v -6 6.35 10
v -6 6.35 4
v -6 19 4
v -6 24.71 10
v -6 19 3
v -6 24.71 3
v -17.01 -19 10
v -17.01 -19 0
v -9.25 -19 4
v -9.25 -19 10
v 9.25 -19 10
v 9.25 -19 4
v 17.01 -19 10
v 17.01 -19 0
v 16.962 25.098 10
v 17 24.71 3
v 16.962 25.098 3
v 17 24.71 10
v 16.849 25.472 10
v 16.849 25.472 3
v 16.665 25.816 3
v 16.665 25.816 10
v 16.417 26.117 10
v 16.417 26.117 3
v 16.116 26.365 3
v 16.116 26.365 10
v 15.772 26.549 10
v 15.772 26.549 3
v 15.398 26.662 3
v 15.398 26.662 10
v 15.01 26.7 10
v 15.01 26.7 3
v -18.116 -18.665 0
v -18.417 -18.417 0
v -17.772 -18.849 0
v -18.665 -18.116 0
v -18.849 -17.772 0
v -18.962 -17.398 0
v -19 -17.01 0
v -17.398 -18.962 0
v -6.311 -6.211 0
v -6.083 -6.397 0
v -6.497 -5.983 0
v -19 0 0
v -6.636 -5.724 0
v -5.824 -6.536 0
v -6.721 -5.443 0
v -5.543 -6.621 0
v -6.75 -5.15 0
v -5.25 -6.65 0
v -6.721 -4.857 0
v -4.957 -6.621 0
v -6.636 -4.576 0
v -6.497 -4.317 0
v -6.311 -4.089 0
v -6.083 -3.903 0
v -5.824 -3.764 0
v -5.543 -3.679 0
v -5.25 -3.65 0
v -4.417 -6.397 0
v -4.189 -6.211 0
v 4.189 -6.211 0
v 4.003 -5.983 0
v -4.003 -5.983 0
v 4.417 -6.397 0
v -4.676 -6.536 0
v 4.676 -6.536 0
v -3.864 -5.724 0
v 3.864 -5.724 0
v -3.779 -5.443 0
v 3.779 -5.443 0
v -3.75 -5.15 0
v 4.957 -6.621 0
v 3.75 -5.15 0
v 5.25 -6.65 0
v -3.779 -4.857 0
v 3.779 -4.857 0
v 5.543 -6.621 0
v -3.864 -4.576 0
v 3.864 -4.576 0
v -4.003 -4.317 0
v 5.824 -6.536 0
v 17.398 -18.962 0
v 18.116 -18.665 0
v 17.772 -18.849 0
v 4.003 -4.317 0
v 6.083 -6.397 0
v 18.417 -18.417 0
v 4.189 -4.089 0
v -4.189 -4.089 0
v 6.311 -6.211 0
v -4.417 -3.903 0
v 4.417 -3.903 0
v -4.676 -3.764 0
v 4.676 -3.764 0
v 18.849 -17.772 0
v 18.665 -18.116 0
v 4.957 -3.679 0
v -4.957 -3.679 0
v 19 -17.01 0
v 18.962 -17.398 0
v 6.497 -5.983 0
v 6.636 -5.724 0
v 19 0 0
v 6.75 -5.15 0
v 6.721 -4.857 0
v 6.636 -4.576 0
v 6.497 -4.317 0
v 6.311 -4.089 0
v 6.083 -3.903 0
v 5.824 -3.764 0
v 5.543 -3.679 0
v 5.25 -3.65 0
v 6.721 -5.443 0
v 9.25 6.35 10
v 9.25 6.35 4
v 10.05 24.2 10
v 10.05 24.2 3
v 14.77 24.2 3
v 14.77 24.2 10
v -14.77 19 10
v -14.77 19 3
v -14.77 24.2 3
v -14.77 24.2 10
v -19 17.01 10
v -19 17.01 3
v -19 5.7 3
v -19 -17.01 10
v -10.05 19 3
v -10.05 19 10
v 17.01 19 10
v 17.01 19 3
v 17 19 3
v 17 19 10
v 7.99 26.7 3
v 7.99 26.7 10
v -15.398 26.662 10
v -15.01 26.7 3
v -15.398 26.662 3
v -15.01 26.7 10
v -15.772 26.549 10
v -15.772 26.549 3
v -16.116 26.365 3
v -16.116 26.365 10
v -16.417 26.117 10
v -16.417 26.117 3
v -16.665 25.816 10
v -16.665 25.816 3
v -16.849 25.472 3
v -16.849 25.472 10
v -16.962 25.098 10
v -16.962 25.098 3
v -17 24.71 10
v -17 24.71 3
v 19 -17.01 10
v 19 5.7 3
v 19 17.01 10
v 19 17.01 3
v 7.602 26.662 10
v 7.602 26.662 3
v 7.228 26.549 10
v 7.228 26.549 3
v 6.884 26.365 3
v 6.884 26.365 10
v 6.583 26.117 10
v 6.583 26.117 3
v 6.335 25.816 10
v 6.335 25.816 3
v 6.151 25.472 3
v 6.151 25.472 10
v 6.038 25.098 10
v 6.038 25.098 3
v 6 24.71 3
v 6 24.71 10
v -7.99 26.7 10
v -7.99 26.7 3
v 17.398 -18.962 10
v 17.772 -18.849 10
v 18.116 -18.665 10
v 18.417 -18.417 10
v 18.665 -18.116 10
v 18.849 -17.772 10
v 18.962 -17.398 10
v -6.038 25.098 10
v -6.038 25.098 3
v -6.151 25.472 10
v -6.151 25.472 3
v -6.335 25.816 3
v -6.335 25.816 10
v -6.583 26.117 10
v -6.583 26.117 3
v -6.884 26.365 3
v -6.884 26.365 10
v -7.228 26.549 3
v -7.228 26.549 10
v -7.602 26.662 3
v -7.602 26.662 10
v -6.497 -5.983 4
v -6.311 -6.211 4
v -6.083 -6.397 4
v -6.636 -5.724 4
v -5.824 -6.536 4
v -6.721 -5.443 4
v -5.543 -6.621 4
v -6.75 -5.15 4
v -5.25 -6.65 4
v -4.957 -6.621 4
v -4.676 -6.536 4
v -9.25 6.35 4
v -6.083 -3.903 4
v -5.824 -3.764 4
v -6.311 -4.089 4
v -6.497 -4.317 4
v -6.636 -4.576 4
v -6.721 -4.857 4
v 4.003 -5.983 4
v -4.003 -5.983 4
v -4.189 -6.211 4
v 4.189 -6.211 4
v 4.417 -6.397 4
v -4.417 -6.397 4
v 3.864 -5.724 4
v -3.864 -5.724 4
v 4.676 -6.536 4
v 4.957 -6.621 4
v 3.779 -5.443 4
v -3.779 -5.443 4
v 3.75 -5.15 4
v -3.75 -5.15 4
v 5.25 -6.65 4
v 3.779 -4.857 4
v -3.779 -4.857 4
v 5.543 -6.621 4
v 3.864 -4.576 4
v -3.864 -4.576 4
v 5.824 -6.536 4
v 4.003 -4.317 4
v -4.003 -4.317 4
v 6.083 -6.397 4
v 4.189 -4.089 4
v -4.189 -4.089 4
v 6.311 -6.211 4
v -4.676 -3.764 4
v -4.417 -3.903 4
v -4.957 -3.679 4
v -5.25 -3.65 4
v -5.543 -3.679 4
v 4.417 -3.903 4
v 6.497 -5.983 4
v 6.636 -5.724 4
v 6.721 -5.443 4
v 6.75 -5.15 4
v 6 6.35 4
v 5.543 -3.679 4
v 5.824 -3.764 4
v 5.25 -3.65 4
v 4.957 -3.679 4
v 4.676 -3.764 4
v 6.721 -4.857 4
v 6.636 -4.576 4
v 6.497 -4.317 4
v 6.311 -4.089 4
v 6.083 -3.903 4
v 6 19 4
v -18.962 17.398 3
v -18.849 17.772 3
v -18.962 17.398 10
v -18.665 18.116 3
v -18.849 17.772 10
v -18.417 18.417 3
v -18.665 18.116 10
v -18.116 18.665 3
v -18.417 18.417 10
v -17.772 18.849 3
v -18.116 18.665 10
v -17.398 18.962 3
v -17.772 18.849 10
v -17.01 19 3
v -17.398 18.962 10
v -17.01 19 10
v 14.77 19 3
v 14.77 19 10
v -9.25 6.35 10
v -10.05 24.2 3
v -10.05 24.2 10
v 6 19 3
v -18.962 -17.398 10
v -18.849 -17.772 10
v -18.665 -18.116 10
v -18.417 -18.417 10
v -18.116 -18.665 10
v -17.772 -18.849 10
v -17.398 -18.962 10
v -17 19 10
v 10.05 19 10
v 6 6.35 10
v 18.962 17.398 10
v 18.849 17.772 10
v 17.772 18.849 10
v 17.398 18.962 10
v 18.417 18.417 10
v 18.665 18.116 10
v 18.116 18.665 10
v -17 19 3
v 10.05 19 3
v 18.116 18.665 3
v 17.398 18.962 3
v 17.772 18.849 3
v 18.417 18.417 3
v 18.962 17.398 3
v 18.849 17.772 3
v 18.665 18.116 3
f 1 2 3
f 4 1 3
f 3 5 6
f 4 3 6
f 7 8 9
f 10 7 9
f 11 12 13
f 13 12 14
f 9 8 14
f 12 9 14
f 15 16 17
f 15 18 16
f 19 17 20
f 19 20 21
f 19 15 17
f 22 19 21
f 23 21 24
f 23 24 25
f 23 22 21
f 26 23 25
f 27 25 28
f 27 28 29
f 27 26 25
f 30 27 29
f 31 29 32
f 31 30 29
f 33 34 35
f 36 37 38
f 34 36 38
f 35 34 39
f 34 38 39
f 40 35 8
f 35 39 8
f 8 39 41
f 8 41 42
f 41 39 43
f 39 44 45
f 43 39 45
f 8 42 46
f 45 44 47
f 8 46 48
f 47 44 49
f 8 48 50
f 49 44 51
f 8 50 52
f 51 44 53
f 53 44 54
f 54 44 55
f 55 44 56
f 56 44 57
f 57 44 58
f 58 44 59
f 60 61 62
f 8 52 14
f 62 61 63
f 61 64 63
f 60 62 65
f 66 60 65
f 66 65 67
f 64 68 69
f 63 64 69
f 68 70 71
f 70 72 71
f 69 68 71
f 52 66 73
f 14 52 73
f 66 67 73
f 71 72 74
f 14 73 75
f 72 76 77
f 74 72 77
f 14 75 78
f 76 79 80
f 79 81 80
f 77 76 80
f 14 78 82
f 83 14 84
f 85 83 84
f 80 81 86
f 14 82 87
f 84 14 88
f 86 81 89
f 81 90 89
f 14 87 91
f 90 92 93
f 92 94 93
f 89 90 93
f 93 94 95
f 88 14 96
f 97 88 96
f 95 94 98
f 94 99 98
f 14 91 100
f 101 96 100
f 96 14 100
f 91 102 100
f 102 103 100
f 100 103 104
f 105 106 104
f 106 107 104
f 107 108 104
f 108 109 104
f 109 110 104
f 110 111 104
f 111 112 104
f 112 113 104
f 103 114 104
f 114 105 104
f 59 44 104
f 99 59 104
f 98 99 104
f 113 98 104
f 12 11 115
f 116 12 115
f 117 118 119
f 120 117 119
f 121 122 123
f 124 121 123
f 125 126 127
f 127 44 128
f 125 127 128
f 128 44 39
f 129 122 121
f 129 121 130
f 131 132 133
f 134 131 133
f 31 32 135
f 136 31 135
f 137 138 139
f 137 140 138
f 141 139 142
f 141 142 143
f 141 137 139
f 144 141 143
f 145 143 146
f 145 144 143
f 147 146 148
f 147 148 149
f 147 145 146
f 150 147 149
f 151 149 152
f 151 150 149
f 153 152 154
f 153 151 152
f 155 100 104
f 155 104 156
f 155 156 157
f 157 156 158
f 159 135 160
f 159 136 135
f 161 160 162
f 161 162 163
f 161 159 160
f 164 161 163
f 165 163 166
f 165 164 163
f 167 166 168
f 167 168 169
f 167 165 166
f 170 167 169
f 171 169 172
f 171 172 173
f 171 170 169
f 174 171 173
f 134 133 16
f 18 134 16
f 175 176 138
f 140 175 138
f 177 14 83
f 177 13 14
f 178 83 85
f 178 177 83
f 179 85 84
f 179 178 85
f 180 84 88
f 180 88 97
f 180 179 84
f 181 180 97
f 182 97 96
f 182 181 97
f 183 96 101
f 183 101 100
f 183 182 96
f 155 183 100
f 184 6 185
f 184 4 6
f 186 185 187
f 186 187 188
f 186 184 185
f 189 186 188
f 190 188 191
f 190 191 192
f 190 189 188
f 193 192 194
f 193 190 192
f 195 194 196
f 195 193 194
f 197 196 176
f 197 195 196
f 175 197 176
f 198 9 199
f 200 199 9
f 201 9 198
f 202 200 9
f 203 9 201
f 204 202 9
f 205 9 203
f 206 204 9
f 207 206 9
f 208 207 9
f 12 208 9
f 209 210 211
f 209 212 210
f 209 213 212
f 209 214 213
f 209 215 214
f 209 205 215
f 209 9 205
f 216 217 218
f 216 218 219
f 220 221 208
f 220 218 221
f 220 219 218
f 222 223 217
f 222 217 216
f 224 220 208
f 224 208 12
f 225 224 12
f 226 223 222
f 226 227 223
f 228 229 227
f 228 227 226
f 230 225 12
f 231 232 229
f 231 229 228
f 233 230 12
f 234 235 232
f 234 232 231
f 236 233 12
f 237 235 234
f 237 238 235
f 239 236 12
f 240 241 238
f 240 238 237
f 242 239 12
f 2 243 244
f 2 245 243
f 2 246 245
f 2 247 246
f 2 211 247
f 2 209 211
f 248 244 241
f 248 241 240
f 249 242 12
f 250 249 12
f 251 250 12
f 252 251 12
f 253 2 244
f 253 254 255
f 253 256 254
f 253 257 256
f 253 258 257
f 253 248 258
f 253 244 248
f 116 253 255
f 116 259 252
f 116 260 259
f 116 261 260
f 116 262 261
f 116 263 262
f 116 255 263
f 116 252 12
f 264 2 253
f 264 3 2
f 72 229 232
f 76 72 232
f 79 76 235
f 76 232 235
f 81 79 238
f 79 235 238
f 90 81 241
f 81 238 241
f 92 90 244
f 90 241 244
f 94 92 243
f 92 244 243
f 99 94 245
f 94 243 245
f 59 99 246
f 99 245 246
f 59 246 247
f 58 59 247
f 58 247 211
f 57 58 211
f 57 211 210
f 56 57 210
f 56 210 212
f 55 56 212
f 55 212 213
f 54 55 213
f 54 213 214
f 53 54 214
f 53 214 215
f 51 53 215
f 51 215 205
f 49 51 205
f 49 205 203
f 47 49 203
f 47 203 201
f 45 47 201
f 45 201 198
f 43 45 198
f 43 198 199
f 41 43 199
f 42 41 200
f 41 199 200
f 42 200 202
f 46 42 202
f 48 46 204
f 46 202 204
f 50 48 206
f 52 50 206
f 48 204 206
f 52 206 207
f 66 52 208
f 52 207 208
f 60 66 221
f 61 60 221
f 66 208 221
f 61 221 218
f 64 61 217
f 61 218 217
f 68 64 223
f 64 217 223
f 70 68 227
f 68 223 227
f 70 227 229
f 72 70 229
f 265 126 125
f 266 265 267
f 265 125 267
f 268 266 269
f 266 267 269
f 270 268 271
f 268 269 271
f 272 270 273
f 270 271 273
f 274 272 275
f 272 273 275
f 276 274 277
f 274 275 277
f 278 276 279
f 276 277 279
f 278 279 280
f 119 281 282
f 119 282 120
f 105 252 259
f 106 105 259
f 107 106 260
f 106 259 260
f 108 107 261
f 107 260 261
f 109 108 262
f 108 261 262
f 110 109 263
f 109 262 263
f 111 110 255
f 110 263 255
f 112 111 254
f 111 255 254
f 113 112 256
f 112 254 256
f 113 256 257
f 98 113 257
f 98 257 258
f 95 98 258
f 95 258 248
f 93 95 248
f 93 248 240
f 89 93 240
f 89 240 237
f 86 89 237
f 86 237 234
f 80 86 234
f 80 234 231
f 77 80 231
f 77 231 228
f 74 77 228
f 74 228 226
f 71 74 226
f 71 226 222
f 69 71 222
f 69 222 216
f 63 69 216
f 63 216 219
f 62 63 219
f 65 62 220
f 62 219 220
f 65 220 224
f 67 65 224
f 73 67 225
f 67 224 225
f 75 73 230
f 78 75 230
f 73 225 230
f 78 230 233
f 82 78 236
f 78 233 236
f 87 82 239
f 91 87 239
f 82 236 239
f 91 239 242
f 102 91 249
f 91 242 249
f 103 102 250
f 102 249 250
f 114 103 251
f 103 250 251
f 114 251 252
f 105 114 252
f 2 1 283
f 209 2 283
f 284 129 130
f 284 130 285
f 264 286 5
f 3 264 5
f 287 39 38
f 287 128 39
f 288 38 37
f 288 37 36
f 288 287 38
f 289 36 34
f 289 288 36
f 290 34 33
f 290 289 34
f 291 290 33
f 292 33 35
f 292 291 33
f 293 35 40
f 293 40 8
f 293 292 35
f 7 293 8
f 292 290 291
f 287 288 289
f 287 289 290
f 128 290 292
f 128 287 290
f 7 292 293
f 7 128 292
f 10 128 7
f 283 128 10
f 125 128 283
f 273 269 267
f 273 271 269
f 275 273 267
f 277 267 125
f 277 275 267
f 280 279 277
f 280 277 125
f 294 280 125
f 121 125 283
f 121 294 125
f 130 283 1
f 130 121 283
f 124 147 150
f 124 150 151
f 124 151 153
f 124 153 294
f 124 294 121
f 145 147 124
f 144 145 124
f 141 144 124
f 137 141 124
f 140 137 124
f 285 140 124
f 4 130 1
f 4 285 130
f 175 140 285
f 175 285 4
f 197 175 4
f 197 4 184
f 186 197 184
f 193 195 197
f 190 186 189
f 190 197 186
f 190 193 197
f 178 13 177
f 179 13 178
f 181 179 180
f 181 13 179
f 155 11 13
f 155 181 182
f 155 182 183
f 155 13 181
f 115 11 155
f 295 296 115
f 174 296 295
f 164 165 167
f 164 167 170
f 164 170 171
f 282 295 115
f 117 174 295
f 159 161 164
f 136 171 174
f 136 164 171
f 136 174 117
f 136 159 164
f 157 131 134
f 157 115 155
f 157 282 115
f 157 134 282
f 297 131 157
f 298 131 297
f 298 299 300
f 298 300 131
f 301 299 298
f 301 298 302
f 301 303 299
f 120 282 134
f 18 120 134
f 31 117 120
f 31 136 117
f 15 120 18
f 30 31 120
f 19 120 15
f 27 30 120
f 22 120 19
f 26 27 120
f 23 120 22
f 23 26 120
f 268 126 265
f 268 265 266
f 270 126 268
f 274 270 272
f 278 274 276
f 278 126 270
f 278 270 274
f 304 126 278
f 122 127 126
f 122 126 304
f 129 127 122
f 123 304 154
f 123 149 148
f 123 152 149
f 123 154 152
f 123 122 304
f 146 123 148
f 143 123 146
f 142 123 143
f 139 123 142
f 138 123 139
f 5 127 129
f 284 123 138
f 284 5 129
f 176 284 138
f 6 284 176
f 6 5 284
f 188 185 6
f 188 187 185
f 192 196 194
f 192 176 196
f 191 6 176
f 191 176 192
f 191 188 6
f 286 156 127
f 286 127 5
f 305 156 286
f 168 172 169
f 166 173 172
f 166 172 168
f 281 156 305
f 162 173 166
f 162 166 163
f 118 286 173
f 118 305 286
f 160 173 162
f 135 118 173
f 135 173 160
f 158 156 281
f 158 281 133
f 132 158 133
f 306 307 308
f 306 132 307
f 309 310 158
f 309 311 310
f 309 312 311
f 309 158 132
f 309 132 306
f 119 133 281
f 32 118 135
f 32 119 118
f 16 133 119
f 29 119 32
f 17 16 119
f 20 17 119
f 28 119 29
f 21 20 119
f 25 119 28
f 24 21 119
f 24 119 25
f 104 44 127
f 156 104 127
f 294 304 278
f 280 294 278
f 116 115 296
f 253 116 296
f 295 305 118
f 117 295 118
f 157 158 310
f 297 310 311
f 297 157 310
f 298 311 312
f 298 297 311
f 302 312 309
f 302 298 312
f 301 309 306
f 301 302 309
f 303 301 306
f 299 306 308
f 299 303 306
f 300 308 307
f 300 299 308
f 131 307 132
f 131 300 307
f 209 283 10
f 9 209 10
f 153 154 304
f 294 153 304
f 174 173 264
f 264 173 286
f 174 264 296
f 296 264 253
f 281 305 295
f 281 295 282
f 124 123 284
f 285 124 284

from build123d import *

# Parameters (mm, degrees)
SKETCH_W        = 4.72
SKETCH_H        = 5.2
PAD_DEPTH       = 10
POCKET_DEPTH    = 38.001
POCKET005_DEPTH = 6
SKETCH003_R     = 1.5
POCKET006_DEPTH = 5
FILLET_R        = 1.99


with BuildPart() as part:
    # Sketch → Pad (new body)
    with BuildSketch(Plane.XY):
        Polygon((-19, 19), (-19, -19), (19, -19), (19, 19), (17, 19), (17, 26.7), (6, 26.7), (6, 19), (-6, 19), (-6, 26.7), (-17, 26.7), (-17, 19), align=None)
        with Locations((-12.41, 21.6)):
            Rectangle(SKETCH_W, SKETCH_H, mode=Mode.SUBTRACT)
        with Locations((12.41, 21.6)):
            Rectangle(SKETCH_W, SKETCH_H, mode=Mode.SUBTRACT)
    extrude(amount=PAD_DEPTH)

    # Sketch001 (on Face3 of Pad) → Pocket (cut, through all)
    with BuildSketch(Plane.YZ.offset(19)):
        Polygon((26.7, 3), (26.7, 0), (0, 0), (5.7, 3), align=None)
    extrude(amount=-POCKET_DEPTH, mode=Mode.SUBTRACT)

    # Sketch002 (on Face6 of Pocket) → Pocket005 (cut)
    with BuildSketch(Plane.XY.offset(10)):
        Polygon((-9.25, -19), (9.25, -19), (9.25, 6.35), (6, 6.35), (6, 19), (-6, 19), (-6, 6.35), (-9.25, 6.35), align=None)
    extrude(amount=-POCKET005_DEPTH, mode=Mode.SUBTRACT)

    # Sketch003 → Pocket006 (cut)
    with BuildSketch(Plane.XY.offset(4)):
        with Locations((-5.25, -5.15)):
            Circle(SKETCH003_R)
        with Locations((5.25, -5.15)):
            Circle(SKETCH003_R)
    extrude(amount=-POCKET006_DEPTH, mode=Mode.SUBTRACT)

    # Fillet
    fillet_edges = [part.edges().sort_by_distance(p)[0] for p in [
        (17, 26.7, 6.5),
        (6, 26.7, 6.5),
        (-6, 26.7, 6.5),
        (-17, 26.7, 6.5),
        (-19, 19, 6.5),
        (19, 19, 6.5),
        (19, -19, 5),
        (-19, -19, 5),
    ]]
    fillet(fillet_edges, radius=FILLET_R)


solid = part.part
